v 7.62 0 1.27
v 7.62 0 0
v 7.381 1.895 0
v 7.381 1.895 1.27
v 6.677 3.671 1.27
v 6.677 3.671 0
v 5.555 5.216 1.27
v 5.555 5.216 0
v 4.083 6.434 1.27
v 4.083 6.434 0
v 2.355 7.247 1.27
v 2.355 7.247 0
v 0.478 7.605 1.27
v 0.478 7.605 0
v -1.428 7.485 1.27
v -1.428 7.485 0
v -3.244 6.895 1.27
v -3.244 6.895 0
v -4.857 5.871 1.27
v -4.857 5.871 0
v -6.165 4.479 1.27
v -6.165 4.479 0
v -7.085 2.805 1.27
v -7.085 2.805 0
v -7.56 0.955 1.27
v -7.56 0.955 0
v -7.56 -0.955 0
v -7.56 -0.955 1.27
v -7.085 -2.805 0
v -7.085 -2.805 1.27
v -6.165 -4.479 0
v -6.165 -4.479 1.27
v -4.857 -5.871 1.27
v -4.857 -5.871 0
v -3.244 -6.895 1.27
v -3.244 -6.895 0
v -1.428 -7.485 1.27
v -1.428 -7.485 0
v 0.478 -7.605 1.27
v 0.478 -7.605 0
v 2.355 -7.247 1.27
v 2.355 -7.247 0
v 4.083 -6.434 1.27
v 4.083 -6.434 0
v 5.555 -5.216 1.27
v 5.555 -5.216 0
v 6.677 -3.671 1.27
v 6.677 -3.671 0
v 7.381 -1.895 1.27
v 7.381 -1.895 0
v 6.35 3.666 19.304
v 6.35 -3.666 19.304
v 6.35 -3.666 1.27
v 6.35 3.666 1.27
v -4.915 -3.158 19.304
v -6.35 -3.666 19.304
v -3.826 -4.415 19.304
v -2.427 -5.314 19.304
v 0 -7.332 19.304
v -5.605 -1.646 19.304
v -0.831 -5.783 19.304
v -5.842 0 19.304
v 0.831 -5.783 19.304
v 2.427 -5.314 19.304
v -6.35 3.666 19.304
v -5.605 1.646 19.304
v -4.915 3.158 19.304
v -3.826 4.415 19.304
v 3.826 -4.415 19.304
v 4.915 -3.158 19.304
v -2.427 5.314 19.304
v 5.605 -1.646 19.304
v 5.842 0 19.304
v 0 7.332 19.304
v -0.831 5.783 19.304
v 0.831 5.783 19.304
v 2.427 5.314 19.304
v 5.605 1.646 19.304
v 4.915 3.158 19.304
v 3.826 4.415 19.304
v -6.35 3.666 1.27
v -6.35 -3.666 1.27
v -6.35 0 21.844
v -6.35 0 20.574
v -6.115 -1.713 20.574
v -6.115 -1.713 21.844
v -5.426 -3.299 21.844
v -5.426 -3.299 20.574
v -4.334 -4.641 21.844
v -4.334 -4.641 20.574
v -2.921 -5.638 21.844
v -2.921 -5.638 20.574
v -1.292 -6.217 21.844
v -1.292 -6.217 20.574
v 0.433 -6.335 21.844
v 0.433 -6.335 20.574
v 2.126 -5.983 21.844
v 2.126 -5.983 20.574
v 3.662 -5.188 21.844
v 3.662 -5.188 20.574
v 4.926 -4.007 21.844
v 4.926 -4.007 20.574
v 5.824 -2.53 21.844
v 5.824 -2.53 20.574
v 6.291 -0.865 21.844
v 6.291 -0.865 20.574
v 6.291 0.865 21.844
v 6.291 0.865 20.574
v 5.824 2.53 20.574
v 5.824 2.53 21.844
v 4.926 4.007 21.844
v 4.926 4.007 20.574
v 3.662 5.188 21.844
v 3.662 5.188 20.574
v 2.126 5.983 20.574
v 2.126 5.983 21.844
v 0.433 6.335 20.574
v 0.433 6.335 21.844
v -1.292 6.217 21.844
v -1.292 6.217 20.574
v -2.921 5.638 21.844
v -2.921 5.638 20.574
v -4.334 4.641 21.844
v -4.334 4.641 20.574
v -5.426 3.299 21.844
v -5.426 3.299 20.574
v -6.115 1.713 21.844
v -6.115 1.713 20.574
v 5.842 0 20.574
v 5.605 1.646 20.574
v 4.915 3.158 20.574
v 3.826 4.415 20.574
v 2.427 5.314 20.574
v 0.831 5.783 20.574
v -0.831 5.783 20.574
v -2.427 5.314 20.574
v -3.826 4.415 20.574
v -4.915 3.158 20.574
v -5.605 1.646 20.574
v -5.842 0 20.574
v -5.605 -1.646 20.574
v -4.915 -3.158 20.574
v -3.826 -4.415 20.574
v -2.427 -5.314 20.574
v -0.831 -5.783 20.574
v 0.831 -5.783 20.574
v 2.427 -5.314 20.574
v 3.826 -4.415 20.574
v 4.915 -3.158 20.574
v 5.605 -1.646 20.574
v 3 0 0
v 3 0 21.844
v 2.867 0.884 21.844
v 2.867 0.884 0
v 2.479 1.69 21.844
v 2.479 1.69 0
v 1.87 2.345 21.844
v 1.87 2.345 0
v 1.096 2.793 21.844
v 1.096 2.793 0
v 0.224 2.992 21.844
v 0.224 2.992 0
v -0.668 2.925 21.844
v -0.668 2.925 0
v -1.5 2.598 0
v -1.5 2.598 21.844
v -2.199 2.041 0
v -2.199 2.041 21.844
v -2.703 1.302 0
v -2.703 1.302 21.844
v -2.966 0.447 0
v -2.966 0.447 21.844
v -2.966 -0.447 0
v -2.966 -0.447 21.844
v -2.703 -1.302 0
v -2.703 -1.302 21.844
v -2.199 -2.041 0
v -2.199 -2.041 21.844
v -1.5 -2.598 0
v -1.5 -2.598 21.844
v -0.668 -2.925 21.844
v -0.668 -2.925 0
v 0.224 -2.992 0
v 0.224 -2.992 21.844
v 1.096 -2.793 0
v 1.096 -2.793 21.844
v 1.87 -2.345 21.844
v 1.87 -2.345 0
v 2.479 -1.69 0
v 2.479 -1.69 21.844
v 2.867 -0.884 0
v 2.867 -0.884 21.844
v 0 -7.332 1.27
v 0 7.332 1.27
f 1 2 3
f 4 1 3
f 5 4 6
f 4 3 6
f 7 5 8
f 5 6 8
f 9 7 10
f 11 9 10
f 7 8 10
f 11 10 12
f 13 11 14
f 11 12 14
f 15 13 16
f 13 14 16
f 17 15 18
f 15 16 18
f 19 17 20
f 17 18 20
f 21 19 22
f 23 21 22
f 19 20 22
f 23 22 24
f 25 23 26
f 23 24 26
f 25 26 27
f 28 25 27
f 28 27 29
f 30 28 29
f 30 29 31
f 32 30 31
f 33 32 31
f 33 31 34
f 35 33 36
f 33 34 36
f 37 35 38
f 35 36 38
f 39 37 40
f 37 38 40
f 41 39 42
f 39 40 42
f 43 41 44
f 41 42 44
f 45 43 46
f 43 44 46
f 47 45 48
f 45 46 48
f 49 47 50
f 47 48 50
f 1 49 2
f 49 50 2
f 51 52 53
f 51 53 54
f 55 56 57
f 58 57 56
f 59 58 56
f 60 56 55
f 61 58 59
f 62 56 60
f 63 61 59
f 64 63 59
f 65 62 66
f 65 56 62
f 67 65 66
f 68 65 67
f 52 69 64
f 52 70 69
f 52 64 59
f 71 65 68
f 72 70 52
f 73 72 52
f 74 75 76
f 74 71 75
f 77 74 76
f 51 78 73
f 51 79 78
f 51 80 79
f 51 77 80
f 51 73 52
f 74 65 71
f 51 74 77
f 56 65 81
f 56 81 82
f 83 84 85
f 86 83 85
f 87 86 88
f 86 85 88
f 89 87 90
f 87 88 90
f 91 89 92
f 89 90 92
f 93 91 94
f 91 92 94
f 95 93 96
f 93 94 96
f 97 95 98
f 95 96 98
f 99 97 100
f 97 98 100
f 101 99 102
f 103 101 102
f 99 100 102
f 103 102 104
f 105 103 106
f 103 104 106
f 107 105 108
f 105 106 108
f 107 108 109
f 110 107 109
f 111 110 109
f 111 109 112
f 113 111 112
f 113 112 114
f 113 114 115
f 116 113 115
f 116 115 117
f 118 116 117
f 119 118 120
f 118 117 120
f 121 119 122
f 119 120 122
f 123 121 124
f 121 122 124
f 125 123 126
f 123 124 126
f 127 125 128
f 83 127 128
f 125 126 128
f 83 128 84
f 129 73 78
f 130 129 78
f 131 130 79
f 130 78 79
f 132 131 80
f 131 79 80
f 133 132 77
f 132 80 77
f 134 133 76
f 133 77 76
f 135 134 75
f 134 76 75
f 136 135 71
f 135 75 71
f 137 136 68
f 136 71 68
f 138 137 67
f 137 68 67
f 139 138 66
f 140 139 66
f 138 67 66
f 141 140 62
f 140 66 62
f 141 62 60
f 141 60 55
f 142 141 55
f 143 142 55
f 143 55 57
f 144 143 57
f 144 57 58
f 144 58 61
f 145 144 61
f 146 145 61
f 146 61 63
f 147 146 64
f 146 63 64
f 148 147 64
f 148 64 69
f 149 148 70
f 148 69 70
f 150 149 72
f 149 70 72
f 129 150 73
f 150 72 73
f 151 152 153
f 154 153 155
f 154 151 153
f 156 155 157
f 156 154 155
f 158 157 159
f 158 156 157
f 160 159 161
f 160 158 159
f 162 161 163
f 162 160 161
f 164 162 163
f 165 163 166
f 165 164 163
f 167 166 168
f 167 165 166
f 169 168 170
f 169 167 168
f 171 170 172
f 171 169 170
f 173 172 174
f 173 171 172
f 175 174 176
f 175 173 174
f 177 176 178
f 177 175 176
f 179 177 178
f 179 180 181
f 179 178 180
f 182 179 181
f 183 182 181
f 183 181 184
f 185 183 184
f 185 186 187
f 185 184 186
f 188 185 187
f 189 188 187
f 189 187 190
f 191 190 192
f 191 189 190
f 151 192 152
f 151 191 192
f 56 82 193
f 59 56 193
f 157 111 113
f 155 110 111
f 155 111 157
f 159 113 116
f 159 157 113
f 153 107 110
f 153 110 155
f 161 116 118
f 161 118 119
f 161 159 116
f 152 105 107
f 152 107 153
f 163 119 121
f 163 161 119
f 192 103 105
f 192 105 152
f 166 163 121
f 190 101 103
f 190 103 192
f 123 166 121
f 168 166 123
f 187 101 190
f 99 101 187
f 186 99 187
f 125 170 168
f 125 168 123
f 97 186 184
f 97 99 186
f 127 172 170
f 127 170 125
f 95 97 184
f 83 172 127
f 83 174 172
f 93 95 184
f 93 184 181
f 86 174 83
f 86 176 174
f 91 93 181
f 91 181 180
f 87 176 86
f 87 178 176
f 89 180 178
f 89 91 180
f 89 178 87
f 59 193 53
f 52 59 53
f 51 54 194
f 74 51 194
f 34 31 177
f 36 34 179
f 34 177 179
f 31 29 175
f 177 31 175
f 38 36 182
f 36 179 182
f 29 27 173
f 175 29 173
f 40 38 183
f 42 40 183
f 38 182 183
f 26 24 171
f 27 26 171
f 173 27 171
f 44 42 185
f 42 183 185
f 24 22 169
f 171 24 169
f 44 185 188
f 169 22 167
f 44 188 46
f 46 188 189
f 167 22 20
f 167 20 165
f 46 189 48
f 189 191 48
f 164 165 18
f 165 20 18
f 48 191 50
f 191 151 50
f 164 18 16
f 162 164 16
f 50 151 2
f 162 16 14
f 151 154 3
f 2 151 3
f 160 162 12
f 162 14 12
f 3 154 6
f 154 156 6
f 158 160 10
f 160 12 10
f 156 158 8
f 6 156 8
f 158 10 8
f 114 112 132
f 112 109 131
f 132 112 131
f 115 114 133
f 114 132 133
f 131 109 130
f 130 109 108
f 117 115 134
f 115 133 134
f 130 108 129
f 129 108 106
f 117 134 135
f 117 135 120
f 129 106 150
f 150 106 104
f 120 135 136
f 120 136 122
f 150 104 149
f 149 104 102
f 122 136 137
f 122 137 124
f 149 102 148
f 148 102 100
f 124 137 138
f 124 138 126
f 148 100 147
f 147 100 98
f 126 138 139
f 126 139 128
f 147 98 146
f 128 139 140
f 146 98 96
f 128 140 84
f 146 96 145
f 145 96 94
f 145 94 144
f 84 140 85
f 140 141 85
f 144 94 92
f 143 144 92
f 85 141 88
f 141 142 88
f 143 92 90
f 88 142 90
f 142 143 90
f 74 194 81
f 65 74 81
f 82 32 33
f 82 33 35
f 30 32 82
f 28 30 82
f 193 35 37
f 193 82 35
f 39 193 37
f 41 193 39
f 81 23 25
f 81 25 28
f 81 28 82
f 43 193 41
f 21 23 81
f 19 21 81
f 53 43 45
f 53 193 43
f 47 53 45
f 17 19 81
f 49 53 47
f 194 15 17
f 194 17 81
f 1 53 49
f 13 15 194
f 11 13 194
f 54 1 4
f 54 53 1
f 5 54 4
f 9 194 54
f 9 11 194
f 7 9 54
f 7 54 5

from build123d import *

# Parameters (mm, degrees)
BOSS_EXTRU_1_DEPTH      = 19.304
ESQUISSE2_R             = 7.62
BOSS_EXTRU_2_DEPTH      = 1.27
ESQUISSE3_R             = 5.842
BOSS_EXTRU_3_DEPTH      = 1.27
ESQUISSE4_R             = 6.35
BOSS_EXTRU_4_DEPTH      = 1.27
ESQUISSE5_R             = 3
ENL_V_MAT_EXTRU_1_DEPTH = 25.357527297


with BuildPart() as part:
    # Esquisse1 → Boss.-Extru.1 (new body)
    with BuildSketch(Plane.XY):
        Polygon((0, 7.332348419), (-6.35, 3.666174209), (-6.35, -3.666174209), (0, -7.332348419), (6.35, -3.666174209), (6.35, 3.666174209), align=None)
    extrude(amount=BOSS_EXTRU_1_DEPTH)

    # Esquisse2 → Boss.-Extru.2 (add)
    with BuildSketch(Plane.XY):
        Circle(ESQUISSE2_R)
    extrude(amount=BOSS_EXTRU_2_DEPTH)

    # Esquisse3 → Boss.-Extru.3 (add)
    with BuildSketch(Plane.XY.offset(19.304)):
        Circle(ESQUISSE3_R)
    extrude(amount=BOSS_EXTRU_3_DEPTH)

    # Esquisse4 → Boss.-Extru.4 (add)
    with BuildSketch(Plane.XY.offset(20.574)):
        with Locations(Location((0, 0, 0), (0, 0, 180))):
            Circle(ESQUISSE4_R)
    extrude(amount=BOSS_EXTRU_4_DEPTH)

    # Esquisse5 → Enlèv. mat.-Extru.1 (cut, through all)
    with BuildSketch(Plane.XY):
        Circle(ESQUISSE5_R)
    extrude(amount=ENL_V_MAT_EXTRU_1_DEPTH, mode=Mode.SUBTRACT)


solid = part.part
